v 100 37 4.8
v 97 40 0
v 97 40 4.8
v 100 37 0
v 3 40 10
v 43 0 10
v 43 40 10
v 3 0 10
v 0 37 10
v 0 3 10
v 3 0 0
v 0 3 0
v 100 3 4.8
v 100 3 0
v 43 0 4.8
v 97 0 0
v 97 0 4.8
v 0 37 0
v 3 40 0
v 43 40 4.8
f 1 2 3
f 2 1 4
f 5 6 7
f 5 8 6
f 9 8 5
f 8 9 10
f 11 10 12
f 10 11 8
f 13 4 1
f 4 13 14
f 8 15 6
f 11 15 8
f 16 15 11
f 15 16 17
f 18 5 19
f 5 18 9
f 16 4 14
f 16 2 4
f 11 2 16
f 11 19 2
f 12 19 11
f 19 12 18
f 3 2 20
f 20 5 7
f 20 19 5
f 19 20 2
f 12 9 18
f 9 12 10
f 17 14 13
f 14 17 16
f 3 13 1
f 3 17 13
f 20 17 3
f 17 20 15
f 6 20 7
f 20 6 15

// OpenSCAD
$fn = 32;

// ----------------------------------------------------------------------
// Stepped bar: endstep, 100 x 40 x 10/4.8 mm
// ----------------------------------------------------------------------

// --- parameters (mm) ---
bar_l = 100;              // bar length, X
bar_w = 40;               // bar width, Y
plate_t = 10;             // thickness of the thick zone, Z
thin_t = 4.8;             // thickness of the thin zone
corner_c = 3;             // corner chamfer of the bar
step_cut = 5.2;           // material removed from the thin zone
step_x = 43;              // step position from the left end
depth_1 = 5.2;            // depth of cut 1 from the top face

profile = [[3, 0], [97, 0], [100, 3], [100, 37], [97, 40], [3, 40], [0, 37], [0, 3]];  // primary outline, 8 points, counter clockwise
void_1 = [[43, -1], [101, -1], [101, 41], [43, 41]];  // thin zone beyond the step, 4 points

// --- the one profile operation ---
difference() {
  linear_extrude(height = plate_t) polygon(points = profile);
  translate([0, 0, plate_t - depth_1])
    linear_extrude(height = depth_1 + 1) polygon(points = void_1);
}
